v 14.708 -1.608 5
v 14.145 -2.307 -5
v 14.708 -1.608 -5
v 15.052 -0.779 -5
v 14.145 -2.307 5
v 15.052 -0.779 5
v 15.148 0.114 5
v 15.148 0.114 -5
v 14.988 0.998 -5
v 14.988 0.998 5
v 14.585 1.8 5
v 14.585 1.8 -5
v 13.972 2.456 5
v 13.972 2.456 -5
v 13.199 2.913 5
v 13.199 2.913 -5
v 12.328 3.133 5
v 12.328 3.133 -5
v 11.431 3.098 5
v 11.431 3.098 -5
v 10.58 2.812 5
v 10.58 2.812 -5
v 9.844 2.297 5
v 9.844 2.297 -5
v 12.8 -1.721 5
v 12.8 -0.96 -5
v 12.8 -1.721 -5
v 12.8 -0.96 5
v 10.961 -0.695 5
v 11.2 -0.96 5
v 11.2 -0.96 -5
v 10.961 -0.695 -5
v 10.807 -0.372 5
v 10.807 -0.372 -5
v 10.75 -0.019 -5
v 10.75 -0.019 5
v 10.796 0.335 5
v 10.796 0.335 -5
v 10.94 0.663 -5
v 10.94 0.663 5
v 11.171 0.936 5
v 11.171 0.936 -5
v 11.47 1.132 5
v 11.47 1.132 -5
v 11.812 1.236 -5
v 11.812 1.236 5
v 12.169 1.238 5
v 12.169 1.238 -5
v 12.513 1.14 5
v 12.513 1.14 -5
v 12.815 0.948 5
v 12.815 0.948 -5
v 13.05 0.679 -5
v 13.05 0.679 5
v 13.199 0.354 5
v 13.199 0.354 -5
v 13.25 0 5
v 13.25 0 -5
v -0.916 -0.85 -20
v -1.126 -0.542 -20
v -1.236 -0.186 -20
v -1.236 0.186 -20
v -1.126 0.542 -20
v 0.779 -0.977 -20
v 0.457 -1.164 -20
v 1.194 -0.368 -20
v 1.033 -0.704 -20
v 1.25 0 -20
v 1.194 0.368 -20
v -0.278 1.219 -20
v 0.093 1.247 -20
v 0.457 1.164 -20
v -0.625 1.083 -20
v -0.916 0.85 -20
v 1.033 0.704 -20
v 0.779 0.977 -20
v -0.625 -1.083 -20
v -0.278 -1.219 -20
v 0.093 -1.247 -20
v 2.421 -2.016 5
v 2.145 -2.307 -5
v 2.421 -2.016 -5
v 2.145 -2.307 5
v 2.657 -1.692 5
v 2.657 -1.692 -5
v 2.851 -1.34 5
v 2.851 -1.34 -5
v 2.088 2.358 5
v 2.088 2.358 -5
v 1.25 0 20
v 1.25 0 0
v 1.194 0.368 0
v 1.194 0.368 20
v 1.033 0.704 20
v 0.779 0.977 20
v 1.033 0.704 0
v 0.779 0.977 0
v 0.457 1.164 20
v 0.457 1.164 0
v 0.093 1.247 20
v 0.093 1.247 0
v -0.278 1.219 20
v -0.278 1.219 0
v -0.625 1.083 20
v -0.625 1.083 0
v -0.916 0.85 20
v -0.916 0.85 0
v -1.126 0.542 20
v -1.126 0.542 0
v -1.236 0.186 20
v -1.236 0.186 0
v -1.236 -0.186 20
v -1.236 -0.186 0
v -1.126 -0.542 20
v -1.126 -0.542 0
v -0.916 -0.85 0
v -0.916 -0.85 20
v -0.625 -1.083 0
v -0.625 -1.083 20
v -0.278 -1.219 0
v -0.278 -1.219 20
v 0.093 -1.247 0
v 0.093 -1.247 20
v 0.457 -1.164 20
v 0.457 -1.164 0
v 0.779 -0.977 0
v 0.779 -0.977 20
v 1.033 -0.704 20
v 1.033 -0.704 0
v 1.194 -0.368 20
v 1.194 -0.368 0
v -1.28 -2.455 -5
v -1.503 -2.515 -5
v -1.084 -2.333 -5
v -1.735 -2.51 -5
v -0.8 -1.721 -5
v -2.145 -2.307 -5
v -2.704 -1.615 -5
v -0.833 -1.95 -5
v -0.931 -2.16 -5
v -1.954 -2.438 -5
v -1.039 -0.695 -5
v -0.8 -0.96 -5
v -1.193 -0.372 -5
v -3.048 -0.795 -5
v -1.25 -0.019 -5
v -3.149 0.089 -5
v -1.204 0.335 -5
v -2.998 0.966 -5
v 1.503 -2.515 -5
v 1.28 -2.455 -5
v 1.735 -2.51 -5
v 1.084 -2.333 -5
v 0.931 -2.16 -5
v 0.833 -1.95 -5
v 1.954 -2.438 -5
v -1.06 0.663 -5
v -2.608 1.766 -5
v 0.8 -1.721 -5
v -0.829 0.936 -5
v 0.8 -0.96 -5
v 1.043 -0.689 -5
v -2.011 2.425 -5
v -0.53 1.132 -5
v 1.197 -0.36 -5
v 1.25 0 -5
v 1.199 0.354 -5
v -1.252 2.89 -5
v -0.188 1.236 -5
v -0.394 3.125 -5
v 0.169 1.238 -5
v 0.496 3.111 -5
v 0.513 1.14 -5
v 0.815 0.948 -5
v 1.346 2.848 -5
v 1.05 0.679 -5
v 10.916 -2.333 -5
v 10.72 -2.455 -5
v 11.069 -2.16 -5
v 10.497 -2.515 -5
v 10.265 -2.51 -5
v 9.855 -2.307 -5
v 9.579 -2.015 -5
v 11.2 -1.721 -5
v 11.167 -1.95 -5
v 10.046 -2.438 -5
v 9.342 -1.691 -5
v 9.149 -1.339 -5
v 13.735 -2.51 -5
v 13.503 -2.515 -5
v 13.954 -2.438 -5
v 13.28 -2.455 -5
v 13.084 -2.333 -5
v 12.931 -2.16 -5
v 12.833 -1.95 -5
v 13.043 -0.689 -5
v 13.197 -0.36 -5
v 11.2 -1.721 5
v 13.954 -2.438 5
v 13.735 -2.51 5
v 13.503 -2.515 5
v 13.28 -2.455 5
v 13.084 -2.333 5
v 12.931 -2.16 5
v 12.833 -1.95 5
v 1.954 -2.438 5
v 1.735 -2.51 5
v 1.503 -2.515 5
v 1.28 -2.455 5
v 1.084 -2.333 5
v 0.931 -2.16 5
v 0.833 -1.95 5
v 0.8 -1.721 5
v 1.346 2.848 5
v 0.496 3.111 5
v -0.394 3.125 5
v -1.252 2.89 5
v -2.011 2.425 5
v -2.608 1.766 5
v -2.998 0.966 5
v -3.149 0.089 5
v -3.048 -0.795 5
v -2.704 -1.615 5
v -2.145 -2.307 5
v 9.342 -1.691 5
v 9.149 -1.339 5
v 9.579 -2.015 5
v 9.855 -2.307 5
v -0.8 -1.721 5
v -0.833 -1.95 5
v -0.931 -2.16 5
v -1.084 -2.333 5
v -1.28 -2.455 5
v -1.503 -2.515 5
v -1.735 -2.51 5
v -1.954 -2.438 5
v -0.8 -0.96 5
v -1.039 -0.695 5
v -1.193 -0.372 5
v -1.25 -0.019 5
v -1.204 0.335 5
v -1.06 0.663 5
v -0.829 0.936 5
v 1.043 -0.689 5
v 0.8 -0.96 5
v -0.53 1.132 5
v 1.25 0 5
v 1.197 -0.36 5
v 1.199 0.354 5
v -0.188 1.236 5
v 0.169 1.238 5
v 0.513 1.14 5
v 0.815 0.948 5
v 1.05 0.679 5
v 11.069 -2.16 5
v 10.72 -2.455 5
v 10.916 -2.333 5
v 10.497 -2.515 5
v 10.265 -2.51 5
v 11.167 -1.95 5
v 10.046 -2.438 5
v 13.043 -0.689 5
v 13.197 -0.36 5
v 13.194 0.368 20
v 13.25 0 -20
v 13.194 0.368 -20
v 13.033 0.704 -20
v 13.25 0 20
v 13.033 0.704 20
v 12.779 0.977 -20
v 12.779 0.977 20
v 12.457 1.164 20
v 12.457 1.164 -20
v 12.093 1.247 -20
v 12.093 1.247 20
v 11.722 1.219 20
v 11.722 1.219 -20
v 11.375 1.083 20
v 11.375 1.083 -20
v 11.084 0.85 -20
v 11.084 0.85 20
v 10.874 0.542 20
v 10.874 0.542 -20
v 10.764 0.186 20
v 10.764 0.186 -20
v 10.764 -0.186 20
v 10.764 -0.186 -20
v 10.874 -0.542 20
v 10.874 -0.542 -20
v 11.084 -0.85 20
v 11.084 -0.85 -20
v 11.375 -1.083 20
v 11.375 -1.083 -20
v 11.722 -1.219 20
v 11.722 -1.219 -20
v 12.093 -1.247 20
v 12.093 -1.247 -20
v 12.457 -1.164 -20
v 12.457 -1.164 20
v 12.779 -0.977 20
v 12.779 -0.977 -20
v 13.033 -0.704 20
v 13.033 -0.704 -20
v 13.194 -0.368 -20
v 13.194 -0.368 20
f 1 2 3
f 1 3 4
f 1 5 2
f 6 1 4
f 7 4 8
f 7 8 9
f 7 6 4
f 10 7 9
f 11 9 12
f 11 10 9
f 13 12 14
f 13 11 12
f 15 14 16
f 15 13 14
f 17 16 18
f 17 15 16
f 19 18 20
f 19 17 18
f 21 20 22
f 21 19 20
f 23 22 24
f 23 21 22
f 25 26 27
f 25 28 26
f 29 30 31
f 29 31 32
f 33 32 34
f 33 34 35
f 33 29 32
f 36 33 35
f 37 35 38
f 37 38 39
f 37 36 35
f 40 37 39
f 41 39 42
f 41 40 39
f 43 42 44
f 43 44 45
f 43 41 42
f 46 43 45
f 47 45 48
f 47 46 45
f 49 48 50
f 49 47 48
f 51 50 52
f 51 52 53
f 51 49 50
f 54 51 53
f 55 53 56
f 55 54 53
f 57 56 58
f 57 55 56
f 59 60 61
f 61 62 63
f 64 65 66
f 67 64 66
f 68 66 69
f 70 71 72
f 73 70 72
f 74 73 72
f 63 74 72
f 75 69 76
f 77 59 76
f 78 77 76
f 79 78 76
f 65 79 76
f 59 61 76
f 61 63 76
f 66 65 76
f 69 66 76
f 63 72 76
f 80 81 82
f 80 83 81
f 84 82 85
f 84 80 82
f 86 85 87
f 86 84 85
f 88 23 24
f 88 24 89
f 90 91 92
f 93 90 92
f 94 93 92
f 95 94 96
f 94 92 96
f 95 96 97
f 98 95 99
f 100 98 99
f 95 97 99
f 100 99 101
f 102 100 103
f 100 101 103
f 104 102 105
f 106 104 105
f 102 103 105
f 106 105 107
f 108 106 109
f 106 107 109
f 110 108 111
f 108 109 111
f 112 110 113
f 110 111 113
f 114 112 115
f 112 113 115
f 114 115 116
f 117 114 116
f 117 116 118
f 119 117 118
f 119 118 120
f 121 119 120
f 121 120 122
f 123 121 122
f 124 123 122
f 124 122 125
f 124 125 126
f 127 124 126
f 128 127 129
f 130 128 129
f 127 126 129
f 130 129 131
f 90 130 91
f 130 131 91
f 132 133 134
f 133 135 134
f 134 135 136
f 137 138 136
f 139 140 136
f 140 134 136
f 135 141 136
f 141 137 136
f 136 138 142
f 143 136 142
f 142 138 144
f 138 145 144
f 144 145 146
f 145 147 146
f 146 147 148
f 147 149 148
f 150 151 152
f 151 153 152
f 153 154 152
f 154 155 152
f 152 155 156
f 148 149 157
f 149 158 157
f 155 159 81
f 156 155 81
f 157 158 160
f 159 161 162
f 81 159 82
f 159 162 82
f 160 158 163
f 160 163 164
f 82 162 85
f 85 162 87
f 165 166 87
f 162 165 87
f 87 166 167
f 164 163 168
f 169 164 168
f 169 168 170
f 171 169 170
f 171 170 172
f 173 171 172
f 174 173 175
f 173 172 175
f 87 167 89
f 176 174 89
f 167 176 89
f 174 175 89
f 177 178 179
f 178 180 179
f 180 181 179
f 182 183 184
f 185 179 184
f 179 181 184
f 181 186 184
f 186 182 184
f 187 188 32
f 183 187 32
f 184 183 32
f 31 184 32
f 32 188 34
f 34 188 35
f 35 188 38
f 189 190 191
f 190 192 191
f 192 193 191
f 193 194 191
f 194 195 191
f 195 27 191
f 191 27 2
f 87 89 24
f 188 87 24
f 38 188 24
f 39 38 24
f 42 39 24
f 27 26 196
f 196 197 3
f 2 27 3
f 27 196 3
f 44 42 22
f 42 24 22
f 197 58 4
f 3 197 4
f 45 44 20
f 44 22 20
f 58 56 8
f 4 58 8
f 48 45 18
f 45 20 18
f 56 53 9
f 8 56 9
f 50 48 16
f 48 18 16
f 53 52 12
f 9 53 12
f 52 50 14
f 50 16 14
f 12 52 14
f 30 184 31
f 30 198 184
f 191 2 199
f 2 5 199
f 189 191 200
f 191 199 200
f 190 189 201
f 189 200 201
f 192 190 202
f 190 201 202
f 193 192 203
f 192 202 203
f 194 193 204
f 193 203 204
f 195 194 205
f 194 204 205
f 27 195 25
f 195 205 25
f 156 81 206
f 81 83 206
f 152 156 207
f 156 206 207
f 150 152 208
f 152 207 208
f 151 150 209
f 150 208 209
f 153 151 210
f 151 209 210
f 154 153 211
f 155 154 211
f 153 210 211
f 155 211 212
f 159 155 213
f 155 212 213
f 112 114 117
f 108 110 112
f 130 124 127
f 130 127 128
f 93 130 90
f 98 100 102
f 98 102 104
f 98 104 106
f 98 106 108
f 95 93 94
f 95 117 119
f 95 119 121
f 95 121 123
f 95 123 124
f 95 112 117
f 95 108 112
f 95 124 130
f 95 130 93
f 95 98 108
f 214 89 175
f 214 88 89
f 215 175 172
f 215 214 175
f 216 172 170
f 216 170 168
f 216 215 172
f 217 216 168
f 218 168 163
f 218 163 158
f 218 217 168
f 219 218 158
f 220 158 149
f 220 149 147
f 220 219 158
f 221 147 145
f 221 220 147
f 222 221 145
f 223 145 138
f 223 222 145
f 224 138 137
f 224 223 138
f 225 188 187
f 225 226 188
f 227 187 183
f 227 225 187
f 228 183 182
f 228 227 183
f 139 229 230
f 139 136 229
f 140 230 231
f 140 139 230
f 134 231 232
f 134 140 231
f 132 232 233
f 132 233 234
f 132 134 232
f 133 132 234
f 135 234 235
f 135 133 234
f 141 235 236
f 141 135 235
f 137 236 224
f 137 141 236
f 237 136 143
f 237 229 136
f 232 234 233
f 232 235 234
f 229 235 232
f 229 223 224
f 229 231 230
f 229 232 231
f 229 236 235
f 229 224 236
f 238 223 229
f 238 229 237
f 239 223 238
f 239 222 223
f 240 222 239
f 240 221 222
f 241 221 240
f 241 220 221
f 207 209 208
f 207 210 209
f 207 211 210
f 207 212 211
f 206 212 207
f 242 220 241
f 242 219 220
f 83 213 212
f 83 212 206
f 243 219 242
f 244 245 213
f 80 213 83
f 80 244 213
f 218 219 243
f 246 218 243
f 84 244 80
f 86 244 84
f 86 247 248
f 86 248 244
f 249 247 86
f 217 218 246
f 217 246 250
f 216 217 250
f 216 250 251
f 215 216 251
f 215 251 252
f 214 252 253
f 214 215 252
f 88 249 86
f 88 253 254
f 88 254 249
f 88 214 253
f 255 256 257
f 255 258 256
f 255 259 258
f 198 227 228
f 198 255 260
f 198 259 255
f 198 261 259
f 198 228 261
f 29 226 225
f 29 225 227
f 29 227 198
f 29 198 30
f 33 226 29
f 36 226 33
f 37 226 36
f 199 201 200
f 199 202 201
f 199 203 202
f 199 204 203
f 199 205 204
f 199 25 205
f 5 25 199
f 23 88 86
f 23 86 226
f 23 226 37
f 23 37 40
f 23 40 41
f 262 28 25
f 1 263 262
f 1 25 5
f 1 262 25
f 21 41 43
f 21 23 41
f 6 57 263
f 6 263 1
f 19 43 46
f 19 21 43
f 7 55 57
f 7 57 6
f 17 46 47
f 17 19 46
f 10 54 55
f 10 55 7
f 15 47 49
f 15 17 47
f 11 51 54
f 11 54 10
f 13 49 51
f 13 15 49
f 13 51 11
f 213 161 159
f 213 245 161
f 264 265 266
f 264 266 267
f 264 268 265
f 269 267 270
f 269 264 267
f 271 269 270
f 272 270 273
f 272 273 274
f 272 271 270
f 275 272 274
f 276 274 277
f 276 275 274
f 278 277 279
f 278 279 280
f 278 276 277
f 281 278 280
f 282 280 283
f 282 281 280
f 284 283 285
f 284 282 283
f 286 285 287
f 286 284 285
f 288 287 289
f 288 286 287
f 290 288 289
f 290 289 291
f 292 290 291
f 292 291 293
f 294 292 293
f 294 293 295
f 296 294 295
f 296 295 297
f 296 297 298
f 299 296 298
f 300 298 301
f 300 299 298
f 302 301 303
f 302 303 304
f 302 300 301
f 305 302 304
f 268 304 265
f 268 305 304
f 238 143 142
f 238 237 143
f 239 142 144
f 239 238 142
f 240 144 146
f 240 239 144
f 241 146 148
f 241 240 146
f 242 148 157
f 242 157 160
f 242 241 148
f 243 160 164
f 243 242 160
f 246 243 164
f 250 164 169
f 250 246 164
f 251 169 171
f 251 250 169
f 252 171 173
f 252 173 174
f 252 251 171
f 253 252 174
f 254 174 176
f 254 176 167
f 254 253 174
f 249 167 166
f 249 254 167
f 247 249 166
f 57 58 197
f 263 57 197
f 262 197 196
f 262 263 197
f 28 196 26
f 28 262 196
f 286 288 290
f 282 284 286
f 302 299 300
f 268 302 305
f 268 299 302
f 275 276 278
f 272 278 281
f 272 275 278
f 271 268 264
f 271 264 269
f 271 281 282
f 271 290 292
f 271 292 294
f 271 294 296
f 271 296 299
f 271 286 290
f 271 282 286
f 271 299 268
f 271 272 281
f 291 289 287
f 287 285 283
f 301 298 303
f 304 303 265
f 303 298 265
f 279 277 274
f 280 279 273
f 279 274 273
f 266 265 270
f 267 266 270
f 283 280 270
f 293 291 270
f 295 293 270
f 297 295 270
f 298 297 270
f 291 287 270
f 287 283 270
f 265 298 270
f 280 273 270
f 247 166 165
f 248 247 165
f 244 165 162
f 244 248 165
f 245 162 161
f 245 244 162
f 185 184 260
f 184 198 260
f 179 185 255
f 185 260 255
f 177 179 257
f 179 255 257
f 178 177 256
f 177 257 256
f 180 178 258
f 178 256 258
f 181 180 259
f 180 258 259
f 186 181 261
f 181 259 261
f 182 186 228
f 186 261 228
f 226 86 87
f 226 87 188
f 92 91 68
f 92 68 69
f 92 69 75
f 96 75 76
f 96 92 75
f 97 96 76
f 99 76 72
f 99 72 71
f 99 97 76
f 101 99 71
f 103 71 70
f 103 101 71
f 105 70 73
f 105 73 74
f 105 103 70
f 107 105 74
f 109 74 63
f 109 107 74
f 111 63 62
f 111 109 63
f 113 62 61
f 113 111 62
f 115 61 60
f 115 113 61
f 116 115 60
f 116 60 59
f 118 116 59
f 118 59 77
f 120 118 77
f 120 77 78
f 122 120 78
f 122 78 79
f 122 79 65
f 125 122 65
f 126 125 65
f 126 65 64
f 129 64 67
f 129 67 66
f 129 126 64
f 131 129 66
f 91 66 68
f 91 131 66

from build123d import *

# Parameters (mm, degrees)
F0_R     = 1.25
F1_DEPTH = 20
F3_DEPTH = 5
F4_R     = 0.8


with BuildPart() as f1:
    # F0 (on Top) → F1 (new body, symmetric)
    with BuildSketch(Plane.XY):
        Circle(F0_R)
        with Locations((12, 0)):
            Circle(F0_R)
    extrude(amount=F1_DEPTH, both=True)


with BuildPart() as f3:
    # F2 (on Top) → F3 (new body, symmetric)
    with BuildSketch(Plane.XY):
        with BuildLine():
            ThreePointArc((-0.8, -0.960469), (-0.53033, 1.131923), (1.25, 0))
            ThreePointArc((1.25, 0), (1.131923, -0.53033), (0.8, -0.960469))
            Line((0.8, -0.960469), (0.8, -3.04672))
            ThreePointArc((0.8, -3.04672), (2.014822, -2.421361), (2.850566, -1.340437))
            Line((2.850566, -1.340437), (9.148695, -1.338865))
            ThreePointArc((9.148695, -1.338865), (9.98451, -2.420806), (11.2, -3.04672))
            Line((11.2, -3.04672), (11.2, -0.960469))
            ThreePointArc((11.2, -0.960469), (11.46967, 1.131923), (13.25, 0))
            ThreePointArc((13.25, 0), (13.131923, -0.53033), (12.8, -0.960469))
            Line((12.8, -0.960469), (12.8, -3.04672))
            ThreePointArc((12.8, -3.04672), (14.756461, 1.524606), (9.844408, 2.296937))
            Line((9.844408, 2.296937), (2.088377, 2.358215))
            ThreePointArc((2.088377, 2.358215), (-2.778185, 1.484652), (-0.8, -3.04672))
            Line((-0.8, -3.04672), (-0.8, -0.960469))
        make_face()
    extrude(amount=F3_DEPTH, both=True)

    # F4
    f4_edges = [f3.edges().sort_by_distance(p)[0] for p in [
        (-0.8, -3.04672, 0),
        (0.8, -3.04672, 0),
        (11.2, -3.04672, 0),
        (12.8, -3.04672, 0),
    ]]
    fillet(f4_edges, radius=F4_R)


solid = Compound([f1.part, f3.part])
